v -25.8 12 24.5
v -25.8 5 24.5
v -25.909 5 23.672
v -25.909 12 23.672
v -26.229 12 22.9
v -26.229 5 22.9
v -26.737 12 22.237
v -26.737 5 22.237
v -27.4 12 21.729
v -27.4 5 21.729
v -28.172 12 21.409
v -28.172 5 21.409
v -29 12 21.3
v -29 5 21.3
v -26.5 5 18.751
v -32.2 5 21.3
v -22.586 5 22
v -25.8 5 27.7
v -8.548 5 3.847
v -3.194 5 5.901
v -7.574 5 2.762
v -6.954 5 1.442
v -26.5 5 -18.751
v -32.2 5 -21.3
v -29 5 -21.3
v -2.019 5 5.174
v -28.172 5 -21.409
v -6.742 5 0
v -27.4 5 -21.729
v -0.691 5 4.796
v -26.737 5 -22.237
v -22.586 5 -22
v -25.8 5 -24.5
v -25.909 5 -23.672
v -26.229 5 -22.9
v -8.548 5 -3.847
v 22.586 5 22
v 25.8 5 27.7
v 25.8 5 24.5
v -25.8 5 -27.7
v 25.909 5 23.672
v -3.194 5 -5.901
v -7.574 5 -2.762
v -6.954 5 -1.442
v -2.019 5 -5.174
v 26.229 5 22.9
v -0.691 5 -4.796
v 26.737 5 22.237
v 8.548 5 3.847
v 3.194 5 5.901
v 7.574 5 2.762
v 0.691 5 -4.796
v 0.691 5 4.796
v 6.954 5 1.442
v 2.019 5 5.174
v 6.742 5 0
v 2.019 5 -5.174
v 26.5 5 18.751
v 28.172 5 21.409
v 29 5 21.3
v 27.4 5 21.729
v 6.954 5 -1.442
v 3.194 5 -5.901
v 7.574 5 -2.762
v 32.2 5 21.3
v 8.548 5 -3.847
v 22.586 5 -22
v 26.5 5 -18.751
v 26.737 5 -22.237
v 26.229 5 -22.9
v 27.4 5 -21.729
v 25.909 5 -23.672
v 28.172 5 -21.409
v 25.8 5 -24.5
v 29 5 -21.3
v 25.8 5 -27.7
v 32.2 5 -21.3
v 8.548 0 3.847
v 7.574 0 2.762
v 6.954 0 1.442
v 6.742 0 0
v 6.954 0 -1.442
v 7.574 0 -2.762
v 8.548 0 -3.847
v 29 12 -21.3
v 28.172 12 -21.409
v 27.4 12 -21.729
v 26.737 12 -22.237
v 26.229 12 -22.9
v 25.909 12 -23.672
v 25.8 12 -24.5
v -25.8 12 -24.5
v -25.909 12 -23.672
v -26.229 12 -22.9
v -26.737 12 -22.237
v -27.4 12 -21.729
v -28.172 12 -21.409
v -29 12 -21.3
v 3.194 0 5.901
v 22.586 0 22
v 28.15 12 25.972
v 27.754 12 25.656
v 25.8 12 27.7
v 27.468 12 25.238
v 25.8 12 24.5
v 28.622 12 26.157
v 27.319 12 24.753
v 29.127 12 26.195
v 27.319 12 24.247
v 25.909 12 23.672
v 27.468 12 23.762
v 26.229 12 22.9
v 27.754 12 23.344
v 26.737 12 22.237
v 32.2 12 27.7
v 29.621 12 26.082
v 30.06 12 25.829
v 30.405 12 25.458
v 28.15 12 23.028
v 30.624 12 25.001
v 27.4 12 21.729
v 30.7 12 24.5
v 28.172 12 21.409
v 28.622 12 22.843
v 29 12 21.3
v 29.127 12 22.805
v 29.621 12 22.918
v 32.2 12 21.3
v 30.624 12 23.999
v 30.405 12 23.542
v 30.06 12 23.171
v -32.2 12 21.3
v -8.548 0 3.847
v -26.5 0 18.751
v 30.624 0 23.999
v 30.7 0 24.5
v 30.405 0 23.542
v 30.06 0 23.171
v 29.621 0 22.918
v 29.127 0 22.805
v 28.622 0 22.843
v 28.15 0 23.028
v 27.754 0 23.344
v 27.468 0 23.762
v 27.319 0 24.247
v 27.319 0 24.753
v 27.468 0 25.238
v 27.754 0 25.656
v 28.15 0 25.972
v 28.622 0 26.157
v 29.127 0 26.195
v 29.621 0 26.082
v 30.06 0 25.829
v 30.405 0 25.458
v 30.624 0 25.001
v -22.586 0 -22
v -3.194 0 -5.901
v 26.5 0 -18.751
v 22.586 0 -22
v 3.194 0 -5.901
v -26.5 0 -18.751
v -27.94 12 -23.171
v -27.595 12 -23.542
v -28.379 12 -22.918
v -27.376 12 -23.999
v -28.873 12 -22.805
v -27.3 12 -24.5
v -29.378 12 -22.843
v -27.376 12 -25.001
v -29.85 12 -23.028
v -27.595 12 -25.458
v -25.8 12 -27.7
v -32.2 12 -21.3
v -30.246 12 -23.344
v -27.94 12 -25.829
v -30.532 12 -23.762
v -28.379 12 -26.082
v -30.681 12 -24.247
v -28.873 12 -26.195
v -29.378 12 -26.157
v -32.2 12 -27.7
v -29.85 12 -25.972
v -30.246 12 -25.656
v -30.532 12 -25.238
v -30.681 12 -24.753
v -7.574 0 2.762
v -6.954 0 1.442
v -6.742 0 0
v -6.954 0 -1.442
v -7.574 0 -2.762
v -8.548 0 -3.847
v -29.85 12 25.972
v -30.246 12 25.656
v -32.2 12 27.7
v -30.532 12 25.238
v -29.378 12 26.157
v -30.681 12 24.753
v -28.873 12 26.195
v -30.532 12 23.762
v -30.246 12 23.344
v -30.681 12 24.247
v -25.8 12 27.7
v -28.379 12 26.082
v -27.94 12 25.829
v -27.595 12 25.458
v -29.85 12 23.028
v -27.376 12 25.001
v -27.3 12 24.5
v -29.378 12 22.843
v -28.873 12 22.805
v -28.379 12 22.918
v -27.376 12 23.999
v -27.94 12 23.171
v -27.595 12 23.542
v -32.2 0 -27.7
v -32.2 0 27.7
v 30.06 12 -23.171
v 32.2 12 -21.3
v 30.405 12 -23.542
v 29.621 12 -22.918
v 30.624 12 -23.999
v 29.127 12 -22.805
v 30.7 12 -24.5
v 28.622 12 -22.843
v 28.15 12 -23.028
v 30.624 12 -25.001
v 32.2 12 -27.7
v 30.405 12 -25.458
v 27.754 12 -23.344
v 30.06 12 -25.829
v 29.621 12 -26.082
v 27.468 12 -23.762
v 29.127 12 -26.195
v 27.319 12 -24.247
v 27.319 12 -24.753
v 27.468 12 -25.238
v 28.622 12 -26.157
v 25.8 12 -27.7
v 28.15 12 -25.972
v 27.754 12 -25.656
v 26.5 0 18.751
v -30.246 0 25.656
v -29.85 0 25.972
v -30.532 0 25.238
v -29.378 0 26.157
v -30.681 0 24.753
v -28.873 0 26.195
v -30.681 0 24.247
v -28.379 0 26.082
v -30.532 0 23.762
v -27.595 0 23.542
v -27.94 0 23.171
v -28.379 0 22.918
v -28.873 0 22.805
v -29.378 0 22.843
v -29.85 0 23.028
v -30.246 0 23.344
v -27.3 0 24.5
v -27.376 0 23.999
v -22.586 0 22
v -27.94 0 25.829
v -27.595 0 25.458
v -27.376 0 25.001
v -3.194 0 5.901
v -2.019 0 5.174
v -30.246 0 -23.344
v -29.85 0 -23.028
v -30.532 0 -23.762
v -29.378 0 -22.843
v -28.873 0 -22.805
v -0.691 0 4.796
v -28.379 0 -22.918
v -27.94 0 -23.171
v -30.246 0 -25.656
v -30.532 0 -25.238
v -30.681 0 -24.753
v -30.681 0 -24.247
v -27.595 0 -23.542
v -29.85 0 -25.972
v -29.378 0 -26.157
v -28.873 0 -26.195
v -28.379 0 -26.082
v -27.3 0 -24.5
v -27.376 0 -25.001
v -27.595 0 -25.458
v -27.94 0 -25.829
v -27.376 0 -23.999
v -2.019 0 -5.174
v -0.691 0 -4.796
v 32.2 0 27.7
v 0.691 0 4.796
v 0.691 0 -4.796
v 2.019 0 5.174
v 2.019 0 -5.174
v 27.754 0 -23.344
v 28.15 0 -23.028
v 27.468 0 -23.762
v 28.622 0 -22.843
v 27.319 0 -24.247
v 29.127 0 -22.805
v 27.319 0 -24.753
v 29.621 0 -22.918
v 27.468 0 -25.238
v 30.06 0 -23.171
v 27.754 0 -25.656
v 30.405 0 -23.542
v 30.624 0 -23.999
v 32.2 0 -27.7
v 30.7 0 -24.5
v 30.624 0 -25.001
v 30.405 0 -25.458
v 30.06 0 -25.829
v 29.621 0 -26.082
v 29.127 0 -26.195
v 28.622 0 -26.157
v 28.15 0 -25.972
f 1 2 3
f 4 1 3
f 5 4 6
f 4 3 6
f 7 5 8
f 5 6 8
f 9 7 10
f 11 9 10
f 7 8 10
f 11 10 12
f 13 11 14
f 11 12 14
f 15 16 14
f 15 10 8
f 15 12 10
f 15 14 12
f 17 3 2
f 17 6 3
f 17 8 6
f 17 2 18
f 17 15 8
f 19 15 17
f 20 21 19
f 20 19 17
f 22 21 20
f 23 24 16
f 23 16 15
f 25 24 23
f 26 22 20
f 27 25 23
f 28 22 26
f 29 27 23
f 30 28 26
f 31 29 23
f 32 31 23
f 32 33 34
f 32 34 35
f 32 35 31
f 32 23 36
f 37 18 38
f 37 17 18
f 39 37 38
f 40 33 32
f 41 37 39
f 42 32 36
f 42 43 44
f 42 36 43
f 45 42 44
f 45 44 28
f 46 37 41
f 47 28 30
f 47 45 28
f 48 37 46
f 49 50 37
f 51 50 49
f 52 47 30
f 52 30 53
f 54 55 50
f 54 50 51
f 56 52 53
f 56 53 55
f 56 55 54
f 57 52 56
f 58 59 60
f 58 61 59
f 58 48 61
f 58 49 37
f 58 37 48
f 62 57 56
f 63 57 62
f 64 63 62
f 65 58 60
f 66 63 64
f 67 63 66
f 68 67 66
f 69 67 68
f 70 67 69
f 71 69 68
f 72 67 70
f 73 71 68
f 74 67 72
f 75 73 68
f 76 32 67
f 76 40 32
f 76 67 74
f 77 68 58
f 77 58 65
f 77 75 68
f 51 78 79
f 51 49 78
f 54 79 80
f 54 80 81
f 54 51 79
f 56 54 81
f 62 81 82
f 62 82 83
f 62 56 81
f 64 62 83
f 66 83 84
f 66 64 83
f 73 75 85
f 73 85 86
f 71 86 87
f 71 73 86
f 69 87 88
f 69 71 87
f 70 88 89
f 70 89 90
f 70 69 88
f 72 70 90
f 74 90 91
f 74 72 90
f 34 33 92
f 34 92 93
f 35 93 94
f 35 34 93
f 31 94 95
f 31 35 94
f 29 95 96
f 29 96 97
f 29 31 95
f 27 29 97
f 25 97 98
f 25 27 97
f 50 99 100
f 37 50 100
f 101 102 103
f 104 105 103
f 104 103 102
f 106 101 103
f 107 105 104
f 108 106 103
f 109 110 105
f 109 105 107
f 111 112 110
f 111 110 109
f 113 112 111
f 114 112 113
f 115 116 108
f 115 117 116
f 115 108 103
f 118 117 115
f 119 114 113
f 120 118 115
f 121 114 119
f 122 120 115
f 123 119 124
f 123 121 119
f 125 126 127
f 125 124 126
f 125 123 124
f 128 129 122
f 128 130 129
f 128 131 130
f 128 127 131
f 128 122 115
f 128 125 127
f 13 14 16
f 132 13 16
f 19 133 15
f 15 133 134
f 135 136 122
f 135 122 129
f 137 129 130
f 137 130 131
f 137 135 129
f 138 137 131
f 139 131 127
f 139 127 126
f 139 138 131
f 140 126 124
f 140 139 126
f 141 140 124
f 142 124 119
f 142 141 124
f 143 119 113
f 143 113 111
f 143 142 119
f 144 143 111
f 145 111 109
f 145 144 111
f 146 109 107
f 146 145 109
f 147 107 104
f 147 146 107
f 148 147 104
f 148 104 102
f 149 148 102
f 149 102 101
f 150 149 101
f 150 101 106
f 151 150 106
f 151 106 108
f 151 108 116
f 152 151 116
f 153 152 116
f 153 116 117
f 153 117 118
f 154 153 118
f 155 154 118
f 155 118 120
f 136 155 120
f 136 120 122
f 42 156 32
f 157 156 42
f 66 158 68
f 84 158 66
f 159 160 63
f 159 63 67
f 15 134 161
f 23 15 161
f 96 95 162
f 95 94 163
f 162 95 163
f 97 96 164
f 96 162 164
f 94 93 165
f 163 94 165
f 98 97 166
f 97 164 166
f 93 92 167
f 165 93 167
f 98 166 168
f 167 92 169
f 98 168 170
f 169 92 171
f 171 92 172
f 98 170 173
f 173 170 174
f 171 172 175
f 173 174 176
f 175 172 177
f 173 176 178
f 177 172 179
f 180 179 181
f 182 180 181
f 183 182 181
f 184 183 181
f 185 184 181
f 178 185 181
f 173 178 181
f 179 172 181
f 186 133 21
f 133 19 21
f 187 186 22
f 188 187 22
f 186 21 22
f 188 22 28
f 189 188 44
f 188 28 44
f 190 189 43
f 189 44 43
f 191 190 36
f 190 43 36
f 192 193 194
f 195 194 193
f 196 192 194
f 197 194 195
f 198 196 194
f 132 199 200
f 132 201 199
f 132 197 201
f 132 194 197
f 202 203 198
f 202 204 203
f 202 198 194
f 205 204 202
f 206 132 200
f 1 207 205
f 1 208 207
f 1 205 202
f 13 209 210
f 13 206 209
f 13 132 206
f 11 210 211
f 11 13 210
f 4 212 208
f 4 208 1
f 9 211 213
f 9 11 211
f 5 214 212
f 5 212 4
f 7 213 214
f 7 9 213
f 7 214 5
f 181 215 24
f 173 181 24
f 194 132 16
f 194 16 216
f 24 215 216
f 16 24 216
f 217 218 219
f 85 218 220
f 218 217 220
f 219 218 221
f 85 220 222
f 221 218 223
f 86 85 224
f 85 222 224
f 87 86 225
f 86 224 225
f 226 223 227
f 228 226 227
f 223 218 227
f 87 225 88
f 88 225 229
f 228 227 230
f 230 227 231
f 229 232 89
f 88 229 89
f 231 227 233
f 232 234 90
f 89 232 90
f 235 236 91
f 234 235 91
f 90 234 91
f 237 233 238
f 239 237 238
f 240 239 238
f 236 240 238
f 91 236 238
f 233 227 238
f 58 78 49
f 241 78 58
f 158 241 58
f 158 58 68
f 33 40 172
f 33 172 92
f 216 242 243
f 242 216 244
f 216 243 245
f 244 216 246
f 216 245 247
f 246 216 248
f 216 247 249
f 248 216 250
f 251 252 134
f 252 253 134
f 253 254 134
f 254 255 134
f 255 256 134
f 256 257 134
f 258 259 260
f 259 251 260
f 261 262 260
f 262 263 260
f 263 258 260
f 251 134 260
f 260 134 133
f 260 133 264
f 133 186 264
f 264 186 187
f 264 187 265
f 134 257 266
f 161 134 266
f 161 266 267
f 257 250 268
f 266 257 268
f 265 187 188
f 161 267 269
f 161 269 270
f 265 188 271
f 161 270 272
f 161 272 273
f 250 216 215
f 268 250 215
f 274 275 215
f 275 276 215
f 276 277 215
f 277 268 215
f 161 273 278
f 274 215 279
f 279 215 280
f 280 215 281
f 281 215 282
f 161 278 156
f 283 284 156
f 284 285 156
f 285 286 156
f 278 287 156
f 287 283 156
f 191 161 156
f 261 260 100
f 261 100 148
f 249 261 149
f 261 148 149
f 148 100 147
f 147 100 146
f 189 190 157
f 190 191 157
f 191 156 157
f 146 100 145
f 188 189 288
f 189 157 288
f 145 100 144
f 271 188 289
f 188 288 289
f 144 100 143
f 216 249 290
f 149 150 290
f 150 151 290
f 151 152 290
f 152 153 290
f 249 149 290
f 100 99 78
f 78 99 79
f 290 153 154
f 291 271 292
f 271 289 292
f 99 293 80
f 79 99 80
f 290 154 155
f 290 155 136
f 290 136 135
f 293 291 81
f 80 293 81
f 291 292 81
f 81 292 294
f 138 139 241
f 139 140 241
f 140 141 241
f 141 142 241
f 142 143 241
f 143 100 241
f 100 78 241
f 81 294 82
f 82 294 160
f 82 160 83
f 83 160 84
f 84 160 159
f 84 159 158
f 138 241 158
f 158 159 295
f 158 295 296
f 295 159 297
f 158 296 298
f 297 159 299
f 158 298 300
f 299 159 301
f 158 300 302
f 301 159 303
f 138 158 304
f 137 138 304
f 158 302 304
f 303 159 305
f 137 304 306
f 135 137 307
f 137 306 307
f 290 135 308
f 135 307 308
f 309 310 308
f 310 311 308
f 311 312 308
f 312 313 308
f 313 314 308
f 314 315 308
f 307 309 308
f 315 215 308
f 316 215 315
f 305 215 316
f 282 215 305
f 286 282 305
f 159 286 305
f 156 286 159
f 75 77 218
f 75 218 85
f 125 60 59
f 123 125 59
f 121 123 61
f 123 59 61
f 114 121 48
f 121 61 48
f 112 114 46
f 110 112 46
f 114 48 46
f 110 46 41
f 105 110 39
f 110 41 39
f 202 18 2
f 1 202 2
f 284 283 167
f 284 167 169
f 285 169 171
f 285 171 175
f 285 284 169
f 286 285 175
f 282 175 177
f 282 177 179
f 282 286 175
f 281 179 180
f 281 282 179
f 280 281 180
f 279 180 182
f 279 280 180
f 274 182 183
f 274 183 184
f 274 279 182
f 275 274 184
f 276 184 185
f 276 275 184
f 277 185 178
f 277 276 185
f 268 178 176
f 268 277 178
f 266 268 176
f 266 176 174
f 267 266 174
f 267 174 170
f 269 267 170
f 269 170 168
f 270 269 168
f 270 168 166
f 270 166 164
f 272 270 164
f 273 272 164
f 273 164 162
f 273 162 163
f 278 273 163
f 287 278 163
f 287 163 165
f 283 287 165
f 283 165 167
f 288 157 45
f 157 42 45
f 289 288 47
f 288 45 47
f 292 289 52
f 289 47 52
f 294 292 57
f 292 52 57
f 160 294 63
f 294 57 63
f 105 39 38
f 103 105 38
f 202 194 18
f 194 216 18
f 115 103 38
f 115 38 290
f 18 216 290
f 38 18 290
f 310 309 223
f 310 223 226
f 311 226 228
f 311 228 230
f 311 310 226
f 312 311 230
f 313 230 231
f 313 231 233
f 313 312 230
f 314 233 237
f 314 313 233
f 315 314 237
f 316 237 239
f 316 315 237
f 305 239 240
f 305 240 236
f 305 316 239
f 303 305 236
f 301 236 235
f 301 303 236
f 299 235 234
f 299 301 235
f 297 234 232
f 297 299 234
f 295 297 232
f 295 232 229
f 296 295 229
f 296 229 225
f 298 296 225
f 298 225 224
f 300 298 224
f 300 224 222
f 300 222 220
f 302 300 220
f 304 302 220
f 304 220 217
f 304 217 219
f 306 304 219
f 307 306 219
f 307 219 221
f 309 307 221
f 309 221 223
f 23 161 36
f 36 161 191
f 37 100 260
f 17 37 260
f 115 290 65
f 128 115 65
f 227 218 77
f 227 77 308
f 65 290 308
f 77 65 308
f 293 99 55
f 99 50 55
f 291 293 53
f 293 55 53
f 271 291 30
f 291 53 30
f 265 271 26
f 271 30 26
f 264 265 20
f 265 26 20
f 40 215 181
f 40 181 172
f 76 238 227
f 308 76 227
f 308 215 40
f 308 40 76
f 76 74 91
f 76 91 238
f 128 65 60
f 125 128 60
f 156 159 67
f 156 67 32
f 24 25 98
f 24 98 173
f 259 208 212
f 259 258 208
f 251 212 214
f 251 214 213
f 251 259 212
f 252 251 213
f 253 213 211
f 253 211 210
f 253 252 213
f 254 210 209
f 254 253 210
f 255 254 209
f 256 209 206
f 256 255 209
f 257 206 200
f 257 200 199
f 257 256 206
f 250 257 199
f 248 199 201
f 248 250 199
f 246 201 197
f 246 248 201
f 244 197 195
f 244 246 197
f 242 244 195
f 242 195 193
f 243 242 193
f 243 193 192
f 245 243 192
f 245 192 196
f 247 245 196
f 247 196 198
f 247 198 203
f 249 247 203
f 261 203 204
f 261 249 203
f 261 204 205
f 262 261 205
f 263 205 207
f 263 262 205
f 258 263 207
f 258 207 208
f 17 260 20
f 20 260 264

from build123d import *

# Parameters (mm, degrees)
SKETCH2_W           = 64.4
SKETCH2_H           = 55.4
SKETCH2_R           = 1.7
BOSS_EXTRUDE1_DEPTH = 5
FILLET1_R           = 5
SKETCH3_R           = 1.7
BOSS_EXTRUDE2_DEPTH = 7


with BuildPart() as part:
    # Sketch2 → Boss-Extrude1 (new body)
    with BuildSketch(Plane(origin=(0, 0, 0), x_dir=(1, 0, 0), z_dir=(0, 1, 0))):
        Rectangle(SKETCH2_W, SKETCH2_H)
        with Locations((-29, 24.5)):
            Circle(SKETCH2_R, mode=Mode.SUBTRACT)
        with Locations((29, 24.5)):
            Circle(SKETCH2_R, mode=Mode.SUBTRACT)
        with Locations((29, -24.5)):
            Circle(SKETCH2_R, mode=Mode.SUBTRACT)
        with Locations((-29, -24.5)):
            Circle(SKETCH2_R, mode=Mode.SUBTRACT)
        Polygon((-26.5, -18.750756585), (-26.5, 18.750756585), (-3.913861386, 0), align=None, mode=Mode.SUBTRACT)
        Polygon((26.5, -18.750756585), (26.5, 18.750756585), (3.913861386, 0), align=None, mode=Mode.SUBTRACT)
        Polygon((-22.586138614, -22), (0, -3.249243415), (22.586138614, -22), align=None, mode=Mode.SUBTRACT)
        Polygon((-22.586138614, 22), (0, 3.249243415), (22.586138614, 22), align=None, mode=Mode.SUBTRACT)
    extrude(amount=BOSS_EXTRUDE1_DEPTH)

    # Fillet1
    fillet1_edges = [part.edges().sort_by_distance(p)[0] for p in [
        (0, 2.5, 3.249243415),
        (3.913861386, 2.5, 0),
        (-3.913861386, 2.5, 0),
        (0, 2.5, -3.249243415),
    ]]
    fillet(fillet1_edges, radius=FILLET1_R)

    # Sketch3 → Boss-Extrude2 (add)
    with BuildSketch(Plane(origin=(0, 5, 0), x_dir=(1, 0, 0), z_dir=(0, 1, 0))):
        with BuildLine():
            Line((-32.2, -21.3), (-32.2, -27.7))
            Line((-32.2, -27.7), (-25.8, -27.7))
            Line((-25.8, -27.7), (-25.8, -24.5))
            ThreePointArc((-25.8, -24.5), (-26.7372583, -22.2372583), (-29, -21.3))
            Line((-29, -21.3), (-32.2, -21.3))
        make_face()
        with Locations((-29, -24.5)):
            Circle(SKETCH3_R, mode=Mode.SUBTRACT)
        with BuildLine():
            Line((-29, 21.3), (-32.2, 21.3))
            Line((-32.2, 21.3), (-32.2, 27.7))
            Line((-32.2, 27.7), (-25.8, 27.7))
            Line((-25.8, 27.7), (-25.8, 24.5))
            ThreePointArc((-25.8, 24.5), (-26.7372583, 22.2372583), (-29, 21.3))
        make_face()
        with Locations((-29, 24.5)):
            Circle(SKETCH3_R, mode=Mode.SUBTRACT)
        with BuildLine():
            Line((25.8, 24.5), (25.8, 27.7))
            Line((25.8, 27.7), (32.2, 27.7))
            Line((32.2, 27.7), (32.2, 21.3))
            Line((32.2, 21.3), (29, 21.3))
            ThreePointArc((29, 21.3), (26.7372583, 22.2372583), (25.8, 24.5))
        make_face()
        with Locations((29, 24.5)):
            Circle(SKETCH3_R, mode=Mode.SUBTRACT)
        with BuildLine():
            Line((25.8, -24.5), (25.8, -27.7))
            Line((25.8, -27.7), (32.2, -27.7))
            Line((32.2, -27.7), (32.2, -21.3))
            Line((32.2, -21.3), (29, -21.3))
            ThreePointArc((29, -21.3), (26.7372583, -22.2372583), (25.8, -24.5))
        make_face()
        with Locations((29, -24.5)):
            Circle(SKETCH3_R, mode=Mode.SUBTRACT)
    extrude(amount=BOSS_EXTRUDE2_DEPTH)


solid = part.part
